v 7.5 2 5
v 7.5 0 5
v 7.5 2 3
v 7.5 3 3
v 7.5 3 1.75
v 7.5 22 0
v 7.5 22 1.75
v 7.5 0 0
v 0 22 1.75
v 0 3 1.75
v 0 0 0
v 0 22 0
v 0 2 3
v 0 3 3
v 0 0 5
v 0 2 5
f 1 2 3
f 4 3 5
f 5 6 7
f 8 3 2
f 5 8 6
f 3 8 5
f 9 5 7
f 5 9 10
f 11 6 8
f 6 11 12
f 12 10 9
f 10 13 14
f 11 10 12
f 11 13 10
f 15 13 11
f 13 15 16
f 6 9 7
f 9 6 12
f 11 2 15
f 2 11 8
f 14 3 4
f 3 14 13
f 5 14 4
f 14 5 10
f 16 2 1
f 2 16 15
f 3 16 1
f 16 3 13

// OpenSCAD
cube([7.5,22, 1.75]);// 18.25
cube([7.5,3,3]);
cube([7.5,2,5]);
